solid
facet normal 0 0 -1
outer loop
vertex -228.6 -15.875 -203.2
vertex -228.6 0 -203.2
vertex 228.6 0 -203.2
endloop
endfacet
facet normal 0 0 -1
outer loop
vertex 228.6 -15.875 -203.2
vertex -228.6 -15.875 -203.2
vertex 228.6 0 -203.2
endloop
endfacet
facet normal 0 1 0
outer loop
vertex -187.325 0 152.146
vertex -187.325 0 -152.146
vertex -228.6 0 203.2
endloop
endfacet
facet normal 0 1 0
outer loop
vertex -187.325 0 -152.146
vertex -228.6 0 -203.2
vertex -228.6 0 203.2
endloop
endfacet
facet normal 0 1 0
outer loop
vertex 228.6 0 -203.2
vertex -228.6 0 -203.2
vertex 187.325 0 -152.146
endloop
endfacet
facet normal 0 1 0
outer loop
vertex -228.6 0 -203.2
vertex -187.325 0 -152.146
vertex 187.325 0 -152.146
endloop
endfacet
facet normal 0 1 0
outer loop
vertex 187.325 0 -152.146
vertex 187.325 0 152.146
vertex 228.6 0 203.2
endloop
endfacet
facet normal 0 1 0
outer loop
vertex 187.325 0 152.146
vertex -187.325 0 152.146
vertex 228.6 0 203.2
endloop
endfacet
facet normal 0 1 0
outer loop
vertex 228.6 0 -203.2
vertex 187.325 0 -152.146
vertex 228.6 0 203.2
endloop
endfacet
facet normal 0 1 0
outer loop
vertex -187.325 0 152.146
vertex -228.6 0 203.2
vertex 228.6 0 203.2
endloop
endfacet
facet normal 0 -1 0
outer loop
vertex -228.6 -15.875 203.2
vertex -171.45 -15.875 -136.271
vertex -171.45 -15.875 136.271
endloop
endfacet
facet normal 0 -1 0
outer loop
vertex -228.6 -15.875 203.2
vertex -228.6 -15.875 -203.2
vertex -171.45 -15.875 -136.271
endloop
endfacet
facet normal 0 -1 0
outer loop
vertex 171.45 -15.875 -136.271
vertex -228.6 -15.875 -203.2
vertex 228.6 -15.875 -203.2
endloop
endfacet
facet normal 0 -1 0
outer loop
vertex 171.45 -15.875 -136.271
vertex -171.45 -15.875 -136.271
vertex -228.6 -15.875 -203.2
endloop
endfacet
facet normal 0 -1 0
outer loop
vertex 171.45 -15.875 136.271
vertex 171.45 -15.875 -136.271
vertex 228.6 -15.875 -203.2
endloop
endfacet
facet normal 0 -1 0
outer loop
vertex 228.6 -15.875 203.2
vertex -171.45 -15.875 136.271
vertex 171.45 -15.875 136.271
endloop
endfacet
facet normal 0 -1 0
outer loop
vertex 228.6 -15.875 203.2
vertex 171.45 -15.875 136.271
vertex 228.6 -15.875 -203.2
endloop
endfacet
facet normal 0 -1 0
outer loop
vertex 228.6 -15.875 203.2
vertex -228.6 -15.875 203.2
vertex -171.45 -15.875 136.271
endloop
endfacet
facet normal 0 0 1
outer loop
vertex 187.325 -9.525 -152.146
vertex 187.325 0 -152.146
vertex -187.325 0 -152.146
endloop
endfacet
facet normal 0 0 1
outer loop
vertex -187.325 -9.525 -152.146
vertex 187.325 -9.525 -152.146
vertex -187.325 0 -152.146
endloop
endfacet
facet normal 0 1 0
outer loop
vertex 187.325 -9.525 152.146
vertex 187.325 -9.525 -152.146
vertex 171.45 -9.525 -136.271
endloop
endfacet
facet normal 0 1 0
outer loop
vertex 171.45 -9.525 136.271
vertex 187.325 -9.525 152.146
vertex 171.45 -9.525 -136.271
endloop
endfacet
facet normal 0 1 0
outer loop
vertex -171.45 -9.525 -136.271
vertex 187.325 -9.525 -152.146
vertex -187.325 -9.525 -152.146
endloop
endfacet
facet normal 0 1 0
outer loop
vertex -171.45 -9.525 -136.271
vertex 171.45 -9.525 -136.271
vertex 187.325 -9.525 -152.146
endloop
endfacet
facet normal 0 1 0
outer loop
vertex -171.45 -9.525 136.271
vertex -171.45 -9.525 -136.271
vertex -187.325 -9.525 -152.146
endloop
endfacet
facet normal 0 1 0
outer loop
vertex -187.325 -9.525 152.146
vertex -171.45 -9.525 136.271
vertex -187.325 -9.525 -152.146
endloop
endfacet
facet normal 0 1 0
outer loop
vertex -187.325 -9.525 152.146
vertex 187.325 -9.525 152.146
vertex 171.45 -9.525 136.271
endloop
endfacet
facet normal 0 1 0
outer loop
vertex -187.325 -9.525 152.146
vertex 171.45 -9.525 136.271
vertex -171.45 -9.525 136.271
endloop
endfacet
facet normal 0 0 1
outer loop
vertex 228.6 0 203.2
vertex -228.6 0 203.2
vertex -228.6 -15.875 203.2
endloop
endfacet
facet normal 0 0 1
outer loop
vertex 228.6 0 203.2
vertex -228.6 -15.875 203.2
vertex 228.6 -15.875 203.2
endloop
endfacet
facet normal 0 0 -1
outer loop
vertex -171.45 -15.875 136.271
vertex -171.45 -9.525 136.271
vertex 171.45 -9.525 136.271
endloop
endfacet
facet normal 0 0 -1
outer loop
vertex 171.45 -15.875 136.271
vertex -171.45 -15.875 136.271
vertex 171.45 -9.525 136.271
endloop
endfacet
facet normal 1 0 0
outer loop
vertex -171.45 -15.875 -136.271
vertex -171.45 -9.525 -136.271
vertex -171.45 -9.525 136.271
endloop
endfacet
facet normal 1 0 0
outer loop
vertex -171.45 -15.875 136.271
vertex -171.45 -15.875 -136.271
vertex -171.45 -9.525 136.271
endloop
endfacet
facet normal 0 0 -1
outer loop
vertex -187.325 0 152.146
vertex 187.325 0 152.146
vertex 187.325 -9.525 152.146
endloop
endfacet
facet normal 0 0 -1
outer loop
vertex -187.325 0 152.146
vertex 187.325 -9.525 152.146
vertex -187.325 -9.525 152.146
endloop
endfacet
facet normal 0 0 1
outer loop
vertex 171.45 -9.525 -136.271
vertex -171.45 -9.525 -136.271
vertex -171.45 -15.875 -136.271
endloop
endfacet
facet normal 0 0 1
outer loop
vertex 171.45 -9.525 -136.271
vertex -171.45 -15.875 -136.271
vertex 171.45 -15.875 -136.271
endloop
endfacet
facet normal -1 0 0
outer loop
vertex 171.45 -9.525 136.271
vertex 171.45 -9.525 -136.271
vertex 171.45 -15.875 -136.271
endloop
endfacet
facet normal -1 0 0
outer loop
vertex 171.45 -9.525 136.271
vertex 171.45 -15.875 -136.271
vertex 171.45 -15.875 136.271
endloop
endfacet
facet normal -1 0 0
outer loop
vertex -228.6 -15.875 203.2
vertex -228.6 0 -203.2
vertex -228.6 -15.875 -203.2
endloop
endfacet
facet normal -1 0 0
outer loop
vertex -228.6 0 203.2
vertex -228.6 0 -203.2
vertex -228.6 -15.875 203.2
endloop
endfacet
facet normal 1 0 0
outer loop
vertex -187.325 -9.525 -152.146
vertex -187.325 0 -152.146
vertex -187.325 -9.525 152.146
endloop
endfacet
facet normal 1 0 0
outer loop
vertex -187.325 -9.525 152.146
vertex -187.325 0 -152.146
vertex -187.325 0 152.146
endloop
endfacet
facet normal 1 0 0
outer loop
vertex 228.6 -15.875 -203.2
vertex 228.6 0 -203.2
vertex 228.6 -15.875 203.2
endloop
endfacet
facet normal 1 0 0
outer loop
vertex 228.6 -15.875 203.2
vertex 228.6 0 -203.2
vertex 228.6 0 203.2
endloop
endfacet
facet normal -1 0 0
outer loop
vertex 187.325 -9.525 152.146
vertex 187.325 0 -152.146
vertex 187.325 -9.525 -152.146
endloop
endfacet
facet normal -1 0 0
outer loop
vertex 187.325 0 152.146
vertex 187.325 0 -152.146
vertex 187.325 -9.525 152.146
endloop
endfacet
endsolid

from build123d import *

# Parameters (mm, degrees)
F0_W     = 457.2
F0_H     = 406.4
F0_W_2   = 342.9
F0_H_2   = 272.542
F1_DEPTH = 15.875
F2_W     = 374.65
F2_H     = 304.292
F2_W_2   = 342.9
F2_H_2   = 272.542
F3_DEPTH = 9.525


with BuildPart() as f1:
    # F0 (on Front) → F1 (new body)
    with BuildSketch(Plane.XZ):
        Rectangle(F0_W, F0_H)
        Rectangle(F0_W_2, F0_H_2, mode=Mode.SUBTRACT)
    extrude(amount=F1_DEPTH)

    # F2 (on face) → F3 (cut)
    with BuildSketch(Plane(origin=(0, 0, 0), x_dir=(-1, 0, 0), z_dir=(0, 1, 0))):
        Rectangle(F2_W, F2_H)
        Rectangle(F2_W_2, F2_H_2, mode=Mode.SUBTRACT)
    extrude(amount=-F3_DEPTH, mode=Mode.SUBTRACT)


solid = f1.part
